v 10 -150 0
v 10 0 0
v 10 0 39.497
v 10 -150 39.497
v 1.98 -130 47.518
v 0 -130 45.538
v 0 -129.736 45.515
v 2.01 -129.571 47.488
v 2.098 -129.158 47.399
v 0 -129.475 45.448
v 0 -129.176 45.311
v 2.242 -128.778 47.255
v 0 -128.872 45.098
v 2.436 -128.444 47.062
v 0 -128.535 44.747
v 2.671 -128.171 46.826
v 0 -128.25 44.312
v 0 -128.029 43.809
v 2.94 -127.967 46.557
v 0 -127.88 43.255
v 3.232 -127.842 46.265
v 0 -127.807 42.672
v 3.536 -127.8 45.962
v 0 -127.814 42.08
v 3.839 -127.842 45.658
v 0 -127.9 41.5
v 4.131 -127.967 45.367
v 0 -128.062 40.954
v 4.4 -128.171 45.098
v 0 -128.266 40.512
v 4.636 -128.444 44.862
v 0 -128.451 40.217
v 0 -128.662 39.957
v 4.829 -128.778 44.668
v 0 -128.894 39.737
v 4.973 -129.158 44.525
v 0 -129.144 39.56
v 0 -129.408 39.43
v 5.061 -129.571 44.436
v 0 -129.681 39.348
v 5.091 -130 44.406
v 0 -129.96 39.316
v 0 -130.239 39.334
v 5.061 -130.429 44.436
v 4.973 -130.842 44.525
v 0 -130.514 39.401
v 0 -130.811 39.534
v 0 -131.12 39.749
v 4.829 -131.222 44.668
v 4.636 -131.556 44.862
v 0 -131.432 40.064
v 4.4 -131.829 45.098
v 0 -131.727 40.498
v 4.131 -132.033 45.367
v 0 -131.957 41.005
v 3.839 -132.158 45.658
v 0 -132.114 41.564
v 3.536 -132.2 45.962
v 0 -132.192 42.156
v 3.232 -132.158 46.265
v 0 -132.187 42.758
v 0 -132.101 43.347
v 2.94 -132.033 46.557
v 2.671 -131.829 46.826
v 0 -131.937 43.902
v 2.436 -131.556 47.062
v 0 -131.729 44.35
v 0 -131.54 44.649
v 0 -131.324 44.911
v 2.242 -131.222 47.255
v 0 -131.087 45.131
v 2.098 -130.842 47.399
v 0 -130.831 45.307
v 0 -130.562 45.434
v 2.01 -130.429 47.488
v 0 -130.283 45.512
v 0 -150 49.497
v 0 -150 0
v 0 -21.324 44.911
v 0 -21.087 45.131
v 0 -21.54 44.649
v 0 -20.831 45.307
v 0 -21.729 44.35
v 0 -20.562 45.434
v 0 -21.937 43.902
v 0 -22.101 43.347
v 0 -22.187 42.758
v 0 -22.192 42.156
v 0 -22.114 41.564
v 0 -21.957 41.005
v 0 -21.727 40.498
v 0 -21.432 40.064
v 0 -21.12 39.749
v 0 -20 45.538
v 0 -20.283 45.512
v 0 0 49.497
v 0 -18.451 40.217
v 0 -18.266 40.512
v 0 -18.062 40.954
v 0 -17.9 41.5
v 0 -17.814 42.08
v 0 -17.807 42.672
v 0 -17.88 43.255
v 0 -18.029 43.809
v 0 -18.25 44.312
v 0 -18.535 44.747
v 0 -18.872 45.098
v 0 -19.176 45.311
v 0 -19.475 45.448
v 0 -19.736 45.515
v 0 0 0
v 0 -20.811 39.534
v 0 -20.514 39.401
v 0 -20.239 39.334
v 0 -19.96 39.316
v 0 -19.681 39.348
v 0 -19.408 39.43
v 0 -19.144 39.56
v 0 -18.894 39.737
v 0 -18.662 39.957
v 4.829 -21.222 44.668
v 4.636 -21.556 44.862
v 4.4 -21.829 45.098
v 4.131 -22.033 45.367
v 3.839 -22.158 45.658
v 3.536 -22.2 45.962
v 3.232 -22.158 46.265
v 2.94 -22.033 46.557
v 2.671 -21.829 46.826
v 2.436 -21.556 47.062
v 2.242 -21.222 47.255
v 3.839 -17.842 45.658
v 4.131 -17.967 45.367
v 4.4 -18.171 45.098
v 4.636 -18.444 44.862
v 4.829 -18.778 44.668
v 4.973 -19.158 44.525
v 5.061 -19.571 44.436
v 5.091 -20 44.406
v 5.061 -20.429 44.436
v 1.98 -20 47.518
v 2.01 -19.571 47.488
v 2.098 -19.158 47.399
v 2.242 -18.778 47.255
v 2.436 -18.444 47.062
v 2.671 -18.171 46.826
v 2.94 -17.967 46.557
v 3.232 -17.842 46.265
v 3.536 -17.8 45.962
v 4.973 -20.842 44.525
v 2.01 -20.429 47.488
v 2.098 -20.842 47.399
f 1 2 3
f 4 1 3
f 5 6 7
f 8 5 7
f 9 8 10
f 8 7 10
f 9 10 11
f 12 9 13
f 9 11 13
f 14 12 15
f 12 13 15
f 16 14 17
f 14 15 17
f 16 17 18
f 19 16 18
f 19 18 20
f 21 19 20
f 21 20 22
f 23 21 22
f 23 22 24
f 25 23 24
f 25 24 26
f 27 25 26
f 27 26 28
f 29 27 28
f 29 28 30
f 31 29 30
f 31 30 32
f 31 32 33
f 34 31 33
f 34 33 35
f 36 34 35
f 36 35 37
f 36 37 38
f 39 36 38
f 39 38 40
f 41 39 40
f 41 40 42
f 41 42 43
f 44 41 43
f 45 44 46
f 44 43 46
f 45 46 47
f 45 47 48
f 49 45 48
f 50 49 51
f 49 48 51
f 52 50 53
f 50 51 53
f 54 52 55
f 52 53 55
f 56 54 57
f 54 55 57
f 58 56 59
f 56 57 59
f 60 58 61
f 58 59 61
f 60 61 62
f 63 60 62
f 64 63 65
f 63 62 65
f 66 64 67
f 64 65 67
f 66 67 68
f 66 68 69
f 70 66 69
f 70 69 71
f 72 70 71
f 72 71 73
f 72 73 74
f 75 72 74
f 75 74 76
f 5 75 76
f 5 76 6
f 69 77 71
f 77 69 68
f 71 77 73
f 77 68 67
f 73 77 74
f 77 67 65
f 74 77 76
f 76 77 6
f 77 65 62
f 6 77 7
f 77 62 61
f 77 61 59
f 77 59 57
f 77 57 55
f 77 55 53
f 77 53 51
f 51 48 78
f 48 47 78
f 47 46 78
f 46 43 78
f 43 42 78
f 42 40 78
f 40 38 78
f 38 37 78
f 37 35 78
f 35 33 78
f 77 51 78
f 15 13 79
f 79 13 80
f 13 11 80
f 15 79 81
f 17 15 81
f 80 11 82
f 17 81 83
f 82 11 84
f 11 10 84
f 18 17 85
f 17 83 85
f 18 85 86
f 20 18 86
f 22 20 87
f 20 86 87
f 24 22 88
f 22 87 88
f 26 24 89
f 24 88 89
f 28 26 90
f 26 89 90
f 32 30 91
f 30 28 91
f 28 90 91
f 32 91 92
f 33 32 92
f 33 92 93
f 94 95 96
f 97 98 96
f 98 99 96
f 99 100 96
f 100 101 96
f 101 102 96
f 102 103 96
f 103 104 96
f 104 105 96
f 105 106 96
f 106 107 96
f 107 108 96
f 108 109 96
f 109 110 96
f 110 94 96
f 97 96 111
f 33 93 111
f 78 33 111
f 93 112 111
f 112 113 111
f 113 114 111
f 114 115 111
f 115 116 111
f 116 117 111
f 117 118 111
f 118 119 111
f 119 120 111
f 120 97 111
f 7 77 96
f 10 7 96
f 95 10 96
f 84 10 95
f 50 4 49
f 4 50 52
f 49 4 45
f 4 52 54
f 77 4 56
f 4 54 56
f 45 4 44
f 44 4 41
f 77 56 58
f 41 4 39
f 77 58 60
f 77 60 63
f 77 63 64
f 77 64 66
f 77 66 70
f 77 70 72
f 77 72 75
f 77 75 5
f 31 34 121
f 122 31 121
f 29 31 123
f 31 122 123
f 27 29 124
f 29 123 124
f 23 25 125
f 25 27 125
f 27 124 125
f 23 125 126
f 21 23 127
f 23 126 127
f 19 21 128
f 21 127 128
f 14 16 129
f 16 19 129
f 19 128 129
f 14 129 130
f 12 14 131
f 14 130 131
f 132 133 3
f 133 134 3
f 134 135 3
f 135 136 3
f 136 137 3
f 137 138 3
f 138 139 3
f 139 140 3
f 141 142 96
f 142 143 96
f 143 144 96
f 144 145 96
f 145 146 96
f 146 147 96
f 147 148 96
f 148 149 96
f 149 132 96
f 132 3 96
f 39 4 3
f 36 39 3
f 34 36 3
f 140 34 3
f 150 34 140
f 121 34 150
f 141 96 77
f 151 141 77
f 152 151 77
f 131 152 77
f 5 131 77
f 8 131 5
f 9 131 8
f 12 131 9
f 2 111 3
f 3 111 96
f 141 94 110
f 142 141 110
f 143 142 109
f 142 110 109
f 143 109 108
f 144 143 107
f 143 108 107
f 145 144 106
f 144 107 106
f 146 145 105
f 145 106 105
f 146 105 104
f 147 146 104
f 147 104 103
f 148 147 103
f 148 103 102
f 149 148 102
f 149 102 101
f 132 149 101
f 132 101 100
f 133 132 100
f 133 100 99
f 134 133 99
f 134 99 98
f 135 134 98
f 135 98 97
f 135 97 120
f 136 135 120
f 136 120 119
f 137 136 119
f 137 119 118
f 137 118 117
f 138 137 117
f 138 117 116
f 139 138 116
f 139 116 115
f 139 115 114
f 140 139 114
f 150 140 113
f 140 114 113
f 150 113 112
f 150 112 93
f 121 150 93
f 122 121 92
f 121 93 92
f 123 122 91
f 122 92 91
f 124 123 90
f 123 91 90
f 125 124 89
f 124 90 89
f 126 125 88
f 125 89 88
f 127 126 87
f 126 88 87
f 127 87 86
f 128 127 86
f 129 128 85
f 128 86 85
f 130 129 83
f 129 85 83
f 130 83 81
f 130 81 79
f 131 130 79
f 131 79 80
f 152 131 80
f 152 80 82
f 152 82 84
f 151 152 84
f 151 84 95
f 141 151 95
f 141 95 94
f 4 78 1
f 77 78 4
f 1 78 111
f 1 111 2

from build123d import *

# Parameters (mm, degrees)
F1_DEPTH = 150
F3_D     = 4.4
F3_DEPTH = 14.1
F3_TIP   = 1.3218933619


with BuildPart() as f1:
    # F0 (on Front) → F1 (new body)
    with BuildSketch(Plane.XZ):
        Polygon((10, 39.4974746831), (0, 49.4974746831), (0, 0), (10, 0), align=None)
    extrude(amount=F1_DEPTH)

    # F3
    with Locations(Plane(origin=(24.7487373415, 0, 24.7487373415), x_dir=(0.7071067812, 0, -0.7071067812), z_dir=(0.7071067812, 0, 0.7071067812))):
        with Locations((-30, -130), (-30, -20)):
            Hole(F3_D / 2, depth=F3_DEPTH)
            with Locations((0, 0, -(F3_DEPTH + F3_TIP / 2))):  # 118° drill point
                Cone(0, F3_D / 2, F3_TIP, mode=Mode.SUBTRACT)


solid = f1.part
